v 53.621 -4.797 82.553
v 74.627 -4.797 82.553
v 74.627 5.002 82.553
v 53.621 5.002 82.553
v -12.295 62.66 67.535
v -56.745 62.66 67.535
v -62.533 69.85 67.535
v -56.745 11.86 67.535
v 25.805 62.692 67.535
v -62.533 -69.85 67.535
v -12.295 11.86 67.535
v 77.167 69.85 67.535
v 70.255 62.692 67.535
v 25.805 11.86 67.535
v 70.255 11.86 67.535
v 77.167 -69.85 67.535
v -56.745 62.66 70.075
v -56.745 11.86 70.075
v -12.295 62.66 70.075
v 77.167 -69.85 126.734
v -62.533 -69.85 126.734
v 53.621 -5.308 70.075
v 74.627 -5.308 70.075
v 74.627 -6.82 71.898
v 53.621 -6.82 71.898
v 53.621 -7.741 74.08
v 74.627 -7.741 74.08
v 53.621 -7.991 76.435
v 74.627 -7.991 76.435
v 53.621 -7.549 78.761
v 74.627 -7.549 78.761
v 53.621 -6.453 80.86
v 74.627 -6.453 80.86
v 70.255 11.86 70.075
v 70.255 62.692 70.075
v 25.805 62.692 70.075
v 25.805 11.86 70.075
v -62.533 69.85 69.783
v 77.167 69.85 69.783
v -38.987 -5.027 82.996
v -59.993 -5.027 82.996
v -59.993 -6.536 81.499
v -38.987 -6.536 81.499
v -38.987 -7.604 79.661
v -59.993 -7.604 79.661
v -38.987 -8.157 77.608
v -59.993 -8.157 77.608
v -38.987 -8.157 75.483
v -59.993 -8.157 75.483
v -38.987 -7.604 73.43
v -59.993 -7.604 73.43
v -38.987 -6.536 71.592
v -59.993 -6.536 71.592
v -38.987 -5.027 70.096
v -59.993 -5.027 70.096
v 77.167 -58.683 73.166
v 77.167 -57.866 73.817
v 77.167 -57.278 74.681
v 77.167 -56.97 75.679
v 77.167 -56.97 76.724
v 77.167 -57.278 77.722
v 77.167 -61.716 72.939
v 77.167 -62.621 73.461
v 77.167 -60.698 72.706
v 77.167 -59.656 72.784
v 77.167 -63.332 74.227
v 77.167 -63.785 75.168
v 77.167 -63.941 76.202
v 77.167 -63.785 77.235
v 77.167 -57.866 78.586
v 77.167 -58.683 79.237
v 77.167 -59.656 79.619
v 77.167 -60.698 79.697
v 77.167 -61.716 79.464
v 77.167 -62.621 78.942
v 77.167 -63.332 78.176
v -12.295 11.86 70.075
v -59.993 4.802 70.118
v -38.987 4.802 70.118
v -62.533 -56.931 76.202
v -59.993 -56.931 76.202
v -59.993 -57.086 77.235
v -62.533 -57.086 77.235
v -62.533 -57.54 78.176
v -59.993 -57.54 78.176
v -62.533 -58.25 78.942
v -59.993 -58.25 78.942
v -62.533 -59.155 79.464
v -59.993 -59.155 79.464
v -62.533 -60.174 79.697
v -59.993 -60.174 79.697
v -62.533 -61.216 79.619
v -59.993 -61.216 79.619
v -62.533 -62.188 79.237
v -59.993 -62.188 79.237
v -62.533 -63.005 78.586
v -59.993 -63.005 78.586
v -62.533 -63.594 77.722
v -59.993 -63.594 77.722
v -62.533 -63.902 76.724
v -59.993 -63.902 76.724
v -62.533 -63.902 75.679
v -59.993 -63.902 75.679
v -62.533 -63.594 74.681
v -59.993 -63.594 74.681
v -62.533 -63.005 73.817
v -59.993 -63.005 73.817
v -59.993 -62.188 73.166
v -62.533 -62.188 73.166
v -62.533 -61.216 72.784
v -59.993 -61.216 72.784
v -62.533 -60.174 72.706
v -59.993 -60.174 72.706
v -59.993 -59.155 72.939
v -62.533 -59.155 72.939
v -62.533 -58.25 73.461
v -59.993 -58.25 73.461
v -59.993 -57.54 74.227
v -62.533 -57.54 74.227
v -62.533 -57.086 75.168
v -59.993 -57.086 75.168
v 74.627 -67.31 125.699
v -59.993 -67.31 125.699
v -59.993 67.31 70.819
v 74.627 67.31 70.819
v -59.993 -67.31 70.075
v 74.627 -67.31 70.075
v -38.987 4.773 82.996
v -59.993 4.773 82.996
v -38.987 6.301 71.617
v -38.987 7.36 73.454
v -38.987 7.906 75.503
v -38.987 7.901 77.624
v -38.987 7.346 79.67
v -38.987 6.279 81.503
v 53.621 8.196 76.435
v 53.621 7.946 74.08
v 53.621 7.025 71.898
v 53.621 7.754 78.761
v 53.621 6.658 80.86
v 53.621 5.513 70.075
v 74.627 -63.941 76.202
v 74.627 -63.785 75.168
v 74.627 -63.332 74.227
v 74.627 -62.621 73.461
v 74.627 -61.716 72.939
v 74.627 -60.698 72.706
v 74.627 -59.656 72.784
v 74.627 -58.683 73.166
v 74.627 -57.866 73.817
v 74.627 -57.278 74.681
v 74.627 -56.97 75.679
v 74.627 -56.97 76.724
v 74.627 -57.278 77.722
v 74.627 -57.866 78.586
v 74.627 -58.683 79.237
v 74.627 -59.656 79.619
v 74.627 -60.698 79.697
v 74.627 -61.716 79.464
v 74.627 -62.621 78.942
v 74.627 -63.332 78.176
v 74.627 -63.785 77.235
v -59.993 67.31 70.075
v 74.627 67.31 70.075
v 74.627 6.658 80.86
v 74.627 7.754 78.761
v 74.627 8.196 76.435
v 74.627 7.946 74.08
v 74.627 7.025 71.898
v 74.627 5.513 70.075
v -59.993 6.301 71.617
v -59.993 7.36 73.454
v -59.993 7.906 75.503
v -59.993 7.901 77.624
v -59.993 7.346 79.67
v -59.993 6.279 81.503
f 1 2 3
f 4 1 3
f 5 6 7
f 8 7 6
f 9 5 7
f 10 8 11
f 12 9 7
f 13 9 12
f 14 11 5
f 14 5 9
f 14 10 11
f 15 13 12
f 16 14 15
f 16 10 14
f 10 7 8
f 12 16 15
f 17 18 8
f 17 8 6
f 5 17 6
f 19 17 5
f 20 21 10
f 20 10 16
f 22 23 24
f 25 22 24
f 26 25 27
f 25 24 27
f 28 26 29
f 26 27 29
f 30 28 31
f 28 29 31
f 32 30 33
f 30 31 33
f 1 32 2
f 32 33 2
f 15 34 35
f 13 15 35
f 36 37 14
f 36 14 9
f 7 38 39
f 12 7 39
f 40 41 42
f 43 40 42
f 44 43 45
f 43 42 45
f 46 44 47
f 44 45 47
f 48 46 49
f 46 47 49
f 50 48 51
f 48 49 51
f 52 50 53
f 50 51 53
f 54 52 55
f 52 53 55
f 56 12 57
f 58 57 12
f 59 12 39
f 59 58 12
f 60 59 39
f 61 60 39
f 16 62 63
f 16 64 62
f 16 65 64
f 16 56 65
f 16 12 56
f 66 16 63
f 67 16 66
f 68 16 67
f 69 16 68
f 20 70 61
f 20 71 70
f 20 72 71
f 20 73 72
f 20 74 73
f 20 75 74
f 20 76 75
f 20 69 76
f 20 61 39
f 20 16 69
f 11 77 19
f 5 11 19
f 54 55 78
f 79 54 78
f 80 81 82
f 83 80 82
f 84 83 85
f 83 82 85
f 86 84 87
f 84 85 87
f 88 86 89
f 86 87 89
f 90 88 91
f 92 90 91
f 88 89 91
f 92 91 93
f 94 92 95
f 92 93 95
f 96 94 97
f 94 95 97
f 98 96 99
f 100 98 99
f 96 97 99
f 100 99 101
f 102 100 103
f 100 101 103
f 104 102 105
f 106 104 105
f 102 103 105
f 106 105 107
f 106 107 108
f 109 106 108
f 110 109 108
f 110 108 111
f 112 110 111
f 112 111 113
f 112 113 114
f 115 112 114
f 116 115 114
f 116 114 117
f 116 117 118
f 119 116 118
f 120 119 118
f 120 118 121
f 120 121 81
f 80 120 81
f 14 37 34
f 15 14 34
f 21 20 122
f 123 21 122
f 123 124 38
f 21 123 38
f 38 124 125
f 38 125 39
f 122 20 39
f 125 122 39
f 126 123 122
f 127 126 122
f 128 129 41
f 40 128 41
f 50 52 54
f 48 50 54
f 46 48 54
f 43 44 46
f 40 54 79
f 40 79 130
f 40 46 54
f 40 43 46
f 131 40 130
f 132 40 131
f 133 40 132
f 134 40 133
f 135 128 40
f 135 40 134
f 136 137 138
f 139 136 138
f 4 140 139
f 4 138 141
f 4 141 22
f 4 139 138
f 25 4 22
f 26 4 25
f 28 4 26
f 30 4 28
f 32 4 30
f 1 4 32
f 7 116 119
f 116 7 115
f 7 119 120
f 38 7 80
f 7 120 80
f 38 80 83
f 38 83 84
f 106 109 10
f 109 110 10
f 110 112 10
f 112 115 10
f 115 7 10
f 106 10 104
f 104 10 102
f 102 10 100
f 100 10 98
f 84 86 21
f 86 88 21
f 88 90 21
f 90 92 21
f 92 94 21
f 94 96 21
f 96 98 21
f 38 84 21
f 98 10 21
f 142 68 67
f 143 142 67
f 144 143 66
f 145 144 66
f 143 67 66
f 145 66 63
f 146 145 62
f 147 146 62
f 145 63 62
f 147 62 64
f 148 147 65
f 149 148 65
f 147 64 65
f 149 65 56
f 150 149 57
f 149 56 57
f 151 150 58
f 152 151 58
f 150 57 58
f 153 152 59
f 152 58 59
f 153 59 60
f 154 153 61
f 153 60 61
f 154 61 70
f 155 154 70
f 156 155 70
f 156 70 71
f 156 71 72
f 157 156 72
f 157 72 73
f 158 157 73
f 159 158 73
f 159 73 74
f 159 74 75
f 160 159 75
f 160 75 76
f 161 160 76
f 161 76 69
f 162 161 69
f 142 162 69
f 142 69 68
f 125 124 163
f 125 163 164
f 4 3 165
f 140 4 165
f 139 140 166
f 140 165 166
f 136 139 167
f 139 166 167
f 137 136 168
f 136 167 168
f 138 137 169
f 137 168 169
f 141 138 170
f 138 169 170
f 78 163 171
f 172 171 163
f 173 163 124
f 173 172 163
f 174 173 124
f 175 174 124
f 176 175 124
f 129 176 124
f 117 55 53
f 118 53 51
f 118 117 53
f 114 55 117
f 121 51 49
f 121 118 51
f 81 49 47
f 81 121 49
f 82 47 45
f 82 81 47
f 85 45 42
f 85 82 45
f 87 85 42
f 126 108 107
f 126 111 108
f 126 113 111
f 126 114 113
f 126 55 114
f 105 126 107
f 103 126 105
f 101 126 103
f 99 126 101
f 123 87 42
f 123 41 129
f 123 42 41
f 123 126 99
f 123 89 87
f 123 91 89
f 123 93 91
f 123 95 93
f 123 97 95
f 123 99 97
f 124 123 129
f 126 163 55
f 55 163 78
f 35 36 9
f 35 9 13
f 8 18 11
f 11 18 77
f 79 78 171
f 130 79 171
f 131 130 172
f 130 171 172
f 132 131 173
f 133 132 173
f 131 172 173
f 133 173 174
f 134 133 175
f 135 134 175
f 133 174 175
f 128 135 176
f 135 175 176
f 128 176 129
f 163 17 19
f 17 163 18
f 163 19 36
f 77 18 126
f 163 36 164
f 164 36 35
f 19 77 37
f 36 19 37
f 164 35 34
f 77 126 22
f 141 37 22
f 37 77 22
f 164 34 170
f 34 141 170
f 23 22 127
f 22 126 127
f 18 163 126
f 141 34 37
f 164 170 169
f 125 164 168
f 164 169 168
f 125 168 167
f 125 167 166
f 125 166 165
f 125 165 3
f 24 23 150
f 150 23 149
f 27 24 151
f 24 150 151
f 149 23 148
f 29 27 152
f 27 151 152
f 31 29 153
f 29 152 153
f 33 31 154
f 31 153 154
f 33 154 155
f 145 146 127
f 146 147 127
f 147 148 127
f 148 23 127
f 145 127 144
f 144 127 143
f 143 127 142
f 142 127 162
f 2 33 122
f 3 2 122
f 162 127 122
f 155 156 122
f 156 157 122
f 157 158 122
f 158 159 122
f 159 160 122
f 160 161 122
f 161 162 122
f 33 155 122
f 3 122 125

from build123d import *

# Parameters (mm, degrees)
F0_W      = 139.7
F0_H      = 139.7
F2_DEPTH  = 69.85
F3_W      = 44.45
F3_H      = 50.8
F4_DEPTH  = 101.6
F3_H_2    = 50.8314919436
F6_DEPTH  = 101.6
F8_T      = -2.54
F10_D     = 7.0104
F10_DEPTH = 62.5339166651
F11_D     = 7.0104
F13_DEPTH = 21.0058
F15_DEPTH = 21.0058


with BuildPart() as f2:
    # F0 (on Front) → F2 (new body, symmetric)
    with BuildSketch(Plane.XZ):
        with Locations((7.3170833349, 137.3853212178)):
            Rectangle(F0_W, F0_H)
    extrude(amount=F2_DEPTH, both=True)


with BuildPart() as f4:
    # F3 (on Top) → F4 (new body, symmetric)
    with BuildSketch(Plane.XY):
        with Locations((-34.519743681, 37.2602967441)):
            Rectangle(F3_W, F3_H)
    extrude(amount=F4_DEPTH, both=True)


with BuildPart() as f4b:
    # F3 (on Top) → F4, piece 2 (new body, symmetric)
    with BuildSketch(Plane.XY):
        with Locations((48.030256319, 37.2760427159)):
            Rectangle(F3_W, F3_H_2)
    extrude(amount=F4_DEPTH, both=True)


with BuildPart() as f6:
    # F5 (on Right) → F6 (new body, symmetric)
    with BuildSketch(Plane.YZ):
        Polygon((76.787297499, 66.9550536128), (134.3187632341, 208.0787243784), (-53.84613112, 284.7873453586), (-111.3775968552, 143.663674593), align=None)
    extrude(amount=F6_DEPTH, both=True)


with BuildPart() as f2_1:
    add(f2.part)

    # F7: cut F6
    add(f6.part, mode=Mode.SUBTRACT)

    # F8
    f8_openings = [f2_1.faces().sort_by_distance(p)[0] for p in [
        (7.317083, 0, 98.258702),
    ]]
    offset(amount=F8_T, openings=f8_openings)

    # F9: cut F4b, F4
    add(f4b.part, mode=Mode.SUBTRACT)
    add(f4.part, mode=Mode.SUBTRACT)

    # F10 (through all, one way)
    with BuildSketch(Plane.YZ):
        with Locations((-60.4358874261, 76.2015281631)):
            Circle(F10_D / 2)
    extrude(amount=-F10_DEPTH, mode=Mode.SUBTRACT)

    # F11 (through all)
    with Locations(Plane(origin=(0, 0, 0), x_dir=(0, 1, 0), z_dir=(-1, 0, 0))):
        with Locations((-60.4358874261, -76.2015281631)):
            Hole(F11_D / 2)

    # F12 (on face) → F13 (join)
    with BuildSketch(Plane(origin=(74.6270833349, 0, 0), x_dir=(0, -1, 0), z_dir=(-1, 0, 0))):
        with BuildLine():
            Line((4.7972360938, 82.5531459689), (-5.0022536889, 82.5531459689))
            ThreePointArc((-5.0022536889, 82.5531459689), (-8.2025087976, 76.1031459689), (-5.0022536889, 69.6531459689))
            Line((-5.0022536889, 69.6531459689), (4.8260011356, 69.6750988441))
            ThreePointArc((4.8260011356, 69.6750988441), (7.9974709963, 76.1212384837), (4.7972360938, 82.5531459689))
        make_face()
    extrude(amount=F13_DEPTH)

    # F14 (on face) → F15 (join)
    with BuildSketch(Plane.YZ.offset(-59.9929166651)):
        with BuildLine():
            Line((4.7729444071, 82.9956434011), (-5.0265453756, 82.9956434011))
            ThreePointArc((-5.0265453756, 82.9956434011), (-8.2268004843, 76.5456434011), (-5.0265453756, 70.0956434011))
            Line((-5.0265453756, 70.0956434011), (4.8017094489, 70.1175962763))
            ThreePointArc((4.8017094489, 70.1175962763), (7.9731793096, 76.5637359159), (4.7729444071, 82.9956434011))
        make_face()
    extrude(amount=F15_DEPTH)


solid = f2_1.part
